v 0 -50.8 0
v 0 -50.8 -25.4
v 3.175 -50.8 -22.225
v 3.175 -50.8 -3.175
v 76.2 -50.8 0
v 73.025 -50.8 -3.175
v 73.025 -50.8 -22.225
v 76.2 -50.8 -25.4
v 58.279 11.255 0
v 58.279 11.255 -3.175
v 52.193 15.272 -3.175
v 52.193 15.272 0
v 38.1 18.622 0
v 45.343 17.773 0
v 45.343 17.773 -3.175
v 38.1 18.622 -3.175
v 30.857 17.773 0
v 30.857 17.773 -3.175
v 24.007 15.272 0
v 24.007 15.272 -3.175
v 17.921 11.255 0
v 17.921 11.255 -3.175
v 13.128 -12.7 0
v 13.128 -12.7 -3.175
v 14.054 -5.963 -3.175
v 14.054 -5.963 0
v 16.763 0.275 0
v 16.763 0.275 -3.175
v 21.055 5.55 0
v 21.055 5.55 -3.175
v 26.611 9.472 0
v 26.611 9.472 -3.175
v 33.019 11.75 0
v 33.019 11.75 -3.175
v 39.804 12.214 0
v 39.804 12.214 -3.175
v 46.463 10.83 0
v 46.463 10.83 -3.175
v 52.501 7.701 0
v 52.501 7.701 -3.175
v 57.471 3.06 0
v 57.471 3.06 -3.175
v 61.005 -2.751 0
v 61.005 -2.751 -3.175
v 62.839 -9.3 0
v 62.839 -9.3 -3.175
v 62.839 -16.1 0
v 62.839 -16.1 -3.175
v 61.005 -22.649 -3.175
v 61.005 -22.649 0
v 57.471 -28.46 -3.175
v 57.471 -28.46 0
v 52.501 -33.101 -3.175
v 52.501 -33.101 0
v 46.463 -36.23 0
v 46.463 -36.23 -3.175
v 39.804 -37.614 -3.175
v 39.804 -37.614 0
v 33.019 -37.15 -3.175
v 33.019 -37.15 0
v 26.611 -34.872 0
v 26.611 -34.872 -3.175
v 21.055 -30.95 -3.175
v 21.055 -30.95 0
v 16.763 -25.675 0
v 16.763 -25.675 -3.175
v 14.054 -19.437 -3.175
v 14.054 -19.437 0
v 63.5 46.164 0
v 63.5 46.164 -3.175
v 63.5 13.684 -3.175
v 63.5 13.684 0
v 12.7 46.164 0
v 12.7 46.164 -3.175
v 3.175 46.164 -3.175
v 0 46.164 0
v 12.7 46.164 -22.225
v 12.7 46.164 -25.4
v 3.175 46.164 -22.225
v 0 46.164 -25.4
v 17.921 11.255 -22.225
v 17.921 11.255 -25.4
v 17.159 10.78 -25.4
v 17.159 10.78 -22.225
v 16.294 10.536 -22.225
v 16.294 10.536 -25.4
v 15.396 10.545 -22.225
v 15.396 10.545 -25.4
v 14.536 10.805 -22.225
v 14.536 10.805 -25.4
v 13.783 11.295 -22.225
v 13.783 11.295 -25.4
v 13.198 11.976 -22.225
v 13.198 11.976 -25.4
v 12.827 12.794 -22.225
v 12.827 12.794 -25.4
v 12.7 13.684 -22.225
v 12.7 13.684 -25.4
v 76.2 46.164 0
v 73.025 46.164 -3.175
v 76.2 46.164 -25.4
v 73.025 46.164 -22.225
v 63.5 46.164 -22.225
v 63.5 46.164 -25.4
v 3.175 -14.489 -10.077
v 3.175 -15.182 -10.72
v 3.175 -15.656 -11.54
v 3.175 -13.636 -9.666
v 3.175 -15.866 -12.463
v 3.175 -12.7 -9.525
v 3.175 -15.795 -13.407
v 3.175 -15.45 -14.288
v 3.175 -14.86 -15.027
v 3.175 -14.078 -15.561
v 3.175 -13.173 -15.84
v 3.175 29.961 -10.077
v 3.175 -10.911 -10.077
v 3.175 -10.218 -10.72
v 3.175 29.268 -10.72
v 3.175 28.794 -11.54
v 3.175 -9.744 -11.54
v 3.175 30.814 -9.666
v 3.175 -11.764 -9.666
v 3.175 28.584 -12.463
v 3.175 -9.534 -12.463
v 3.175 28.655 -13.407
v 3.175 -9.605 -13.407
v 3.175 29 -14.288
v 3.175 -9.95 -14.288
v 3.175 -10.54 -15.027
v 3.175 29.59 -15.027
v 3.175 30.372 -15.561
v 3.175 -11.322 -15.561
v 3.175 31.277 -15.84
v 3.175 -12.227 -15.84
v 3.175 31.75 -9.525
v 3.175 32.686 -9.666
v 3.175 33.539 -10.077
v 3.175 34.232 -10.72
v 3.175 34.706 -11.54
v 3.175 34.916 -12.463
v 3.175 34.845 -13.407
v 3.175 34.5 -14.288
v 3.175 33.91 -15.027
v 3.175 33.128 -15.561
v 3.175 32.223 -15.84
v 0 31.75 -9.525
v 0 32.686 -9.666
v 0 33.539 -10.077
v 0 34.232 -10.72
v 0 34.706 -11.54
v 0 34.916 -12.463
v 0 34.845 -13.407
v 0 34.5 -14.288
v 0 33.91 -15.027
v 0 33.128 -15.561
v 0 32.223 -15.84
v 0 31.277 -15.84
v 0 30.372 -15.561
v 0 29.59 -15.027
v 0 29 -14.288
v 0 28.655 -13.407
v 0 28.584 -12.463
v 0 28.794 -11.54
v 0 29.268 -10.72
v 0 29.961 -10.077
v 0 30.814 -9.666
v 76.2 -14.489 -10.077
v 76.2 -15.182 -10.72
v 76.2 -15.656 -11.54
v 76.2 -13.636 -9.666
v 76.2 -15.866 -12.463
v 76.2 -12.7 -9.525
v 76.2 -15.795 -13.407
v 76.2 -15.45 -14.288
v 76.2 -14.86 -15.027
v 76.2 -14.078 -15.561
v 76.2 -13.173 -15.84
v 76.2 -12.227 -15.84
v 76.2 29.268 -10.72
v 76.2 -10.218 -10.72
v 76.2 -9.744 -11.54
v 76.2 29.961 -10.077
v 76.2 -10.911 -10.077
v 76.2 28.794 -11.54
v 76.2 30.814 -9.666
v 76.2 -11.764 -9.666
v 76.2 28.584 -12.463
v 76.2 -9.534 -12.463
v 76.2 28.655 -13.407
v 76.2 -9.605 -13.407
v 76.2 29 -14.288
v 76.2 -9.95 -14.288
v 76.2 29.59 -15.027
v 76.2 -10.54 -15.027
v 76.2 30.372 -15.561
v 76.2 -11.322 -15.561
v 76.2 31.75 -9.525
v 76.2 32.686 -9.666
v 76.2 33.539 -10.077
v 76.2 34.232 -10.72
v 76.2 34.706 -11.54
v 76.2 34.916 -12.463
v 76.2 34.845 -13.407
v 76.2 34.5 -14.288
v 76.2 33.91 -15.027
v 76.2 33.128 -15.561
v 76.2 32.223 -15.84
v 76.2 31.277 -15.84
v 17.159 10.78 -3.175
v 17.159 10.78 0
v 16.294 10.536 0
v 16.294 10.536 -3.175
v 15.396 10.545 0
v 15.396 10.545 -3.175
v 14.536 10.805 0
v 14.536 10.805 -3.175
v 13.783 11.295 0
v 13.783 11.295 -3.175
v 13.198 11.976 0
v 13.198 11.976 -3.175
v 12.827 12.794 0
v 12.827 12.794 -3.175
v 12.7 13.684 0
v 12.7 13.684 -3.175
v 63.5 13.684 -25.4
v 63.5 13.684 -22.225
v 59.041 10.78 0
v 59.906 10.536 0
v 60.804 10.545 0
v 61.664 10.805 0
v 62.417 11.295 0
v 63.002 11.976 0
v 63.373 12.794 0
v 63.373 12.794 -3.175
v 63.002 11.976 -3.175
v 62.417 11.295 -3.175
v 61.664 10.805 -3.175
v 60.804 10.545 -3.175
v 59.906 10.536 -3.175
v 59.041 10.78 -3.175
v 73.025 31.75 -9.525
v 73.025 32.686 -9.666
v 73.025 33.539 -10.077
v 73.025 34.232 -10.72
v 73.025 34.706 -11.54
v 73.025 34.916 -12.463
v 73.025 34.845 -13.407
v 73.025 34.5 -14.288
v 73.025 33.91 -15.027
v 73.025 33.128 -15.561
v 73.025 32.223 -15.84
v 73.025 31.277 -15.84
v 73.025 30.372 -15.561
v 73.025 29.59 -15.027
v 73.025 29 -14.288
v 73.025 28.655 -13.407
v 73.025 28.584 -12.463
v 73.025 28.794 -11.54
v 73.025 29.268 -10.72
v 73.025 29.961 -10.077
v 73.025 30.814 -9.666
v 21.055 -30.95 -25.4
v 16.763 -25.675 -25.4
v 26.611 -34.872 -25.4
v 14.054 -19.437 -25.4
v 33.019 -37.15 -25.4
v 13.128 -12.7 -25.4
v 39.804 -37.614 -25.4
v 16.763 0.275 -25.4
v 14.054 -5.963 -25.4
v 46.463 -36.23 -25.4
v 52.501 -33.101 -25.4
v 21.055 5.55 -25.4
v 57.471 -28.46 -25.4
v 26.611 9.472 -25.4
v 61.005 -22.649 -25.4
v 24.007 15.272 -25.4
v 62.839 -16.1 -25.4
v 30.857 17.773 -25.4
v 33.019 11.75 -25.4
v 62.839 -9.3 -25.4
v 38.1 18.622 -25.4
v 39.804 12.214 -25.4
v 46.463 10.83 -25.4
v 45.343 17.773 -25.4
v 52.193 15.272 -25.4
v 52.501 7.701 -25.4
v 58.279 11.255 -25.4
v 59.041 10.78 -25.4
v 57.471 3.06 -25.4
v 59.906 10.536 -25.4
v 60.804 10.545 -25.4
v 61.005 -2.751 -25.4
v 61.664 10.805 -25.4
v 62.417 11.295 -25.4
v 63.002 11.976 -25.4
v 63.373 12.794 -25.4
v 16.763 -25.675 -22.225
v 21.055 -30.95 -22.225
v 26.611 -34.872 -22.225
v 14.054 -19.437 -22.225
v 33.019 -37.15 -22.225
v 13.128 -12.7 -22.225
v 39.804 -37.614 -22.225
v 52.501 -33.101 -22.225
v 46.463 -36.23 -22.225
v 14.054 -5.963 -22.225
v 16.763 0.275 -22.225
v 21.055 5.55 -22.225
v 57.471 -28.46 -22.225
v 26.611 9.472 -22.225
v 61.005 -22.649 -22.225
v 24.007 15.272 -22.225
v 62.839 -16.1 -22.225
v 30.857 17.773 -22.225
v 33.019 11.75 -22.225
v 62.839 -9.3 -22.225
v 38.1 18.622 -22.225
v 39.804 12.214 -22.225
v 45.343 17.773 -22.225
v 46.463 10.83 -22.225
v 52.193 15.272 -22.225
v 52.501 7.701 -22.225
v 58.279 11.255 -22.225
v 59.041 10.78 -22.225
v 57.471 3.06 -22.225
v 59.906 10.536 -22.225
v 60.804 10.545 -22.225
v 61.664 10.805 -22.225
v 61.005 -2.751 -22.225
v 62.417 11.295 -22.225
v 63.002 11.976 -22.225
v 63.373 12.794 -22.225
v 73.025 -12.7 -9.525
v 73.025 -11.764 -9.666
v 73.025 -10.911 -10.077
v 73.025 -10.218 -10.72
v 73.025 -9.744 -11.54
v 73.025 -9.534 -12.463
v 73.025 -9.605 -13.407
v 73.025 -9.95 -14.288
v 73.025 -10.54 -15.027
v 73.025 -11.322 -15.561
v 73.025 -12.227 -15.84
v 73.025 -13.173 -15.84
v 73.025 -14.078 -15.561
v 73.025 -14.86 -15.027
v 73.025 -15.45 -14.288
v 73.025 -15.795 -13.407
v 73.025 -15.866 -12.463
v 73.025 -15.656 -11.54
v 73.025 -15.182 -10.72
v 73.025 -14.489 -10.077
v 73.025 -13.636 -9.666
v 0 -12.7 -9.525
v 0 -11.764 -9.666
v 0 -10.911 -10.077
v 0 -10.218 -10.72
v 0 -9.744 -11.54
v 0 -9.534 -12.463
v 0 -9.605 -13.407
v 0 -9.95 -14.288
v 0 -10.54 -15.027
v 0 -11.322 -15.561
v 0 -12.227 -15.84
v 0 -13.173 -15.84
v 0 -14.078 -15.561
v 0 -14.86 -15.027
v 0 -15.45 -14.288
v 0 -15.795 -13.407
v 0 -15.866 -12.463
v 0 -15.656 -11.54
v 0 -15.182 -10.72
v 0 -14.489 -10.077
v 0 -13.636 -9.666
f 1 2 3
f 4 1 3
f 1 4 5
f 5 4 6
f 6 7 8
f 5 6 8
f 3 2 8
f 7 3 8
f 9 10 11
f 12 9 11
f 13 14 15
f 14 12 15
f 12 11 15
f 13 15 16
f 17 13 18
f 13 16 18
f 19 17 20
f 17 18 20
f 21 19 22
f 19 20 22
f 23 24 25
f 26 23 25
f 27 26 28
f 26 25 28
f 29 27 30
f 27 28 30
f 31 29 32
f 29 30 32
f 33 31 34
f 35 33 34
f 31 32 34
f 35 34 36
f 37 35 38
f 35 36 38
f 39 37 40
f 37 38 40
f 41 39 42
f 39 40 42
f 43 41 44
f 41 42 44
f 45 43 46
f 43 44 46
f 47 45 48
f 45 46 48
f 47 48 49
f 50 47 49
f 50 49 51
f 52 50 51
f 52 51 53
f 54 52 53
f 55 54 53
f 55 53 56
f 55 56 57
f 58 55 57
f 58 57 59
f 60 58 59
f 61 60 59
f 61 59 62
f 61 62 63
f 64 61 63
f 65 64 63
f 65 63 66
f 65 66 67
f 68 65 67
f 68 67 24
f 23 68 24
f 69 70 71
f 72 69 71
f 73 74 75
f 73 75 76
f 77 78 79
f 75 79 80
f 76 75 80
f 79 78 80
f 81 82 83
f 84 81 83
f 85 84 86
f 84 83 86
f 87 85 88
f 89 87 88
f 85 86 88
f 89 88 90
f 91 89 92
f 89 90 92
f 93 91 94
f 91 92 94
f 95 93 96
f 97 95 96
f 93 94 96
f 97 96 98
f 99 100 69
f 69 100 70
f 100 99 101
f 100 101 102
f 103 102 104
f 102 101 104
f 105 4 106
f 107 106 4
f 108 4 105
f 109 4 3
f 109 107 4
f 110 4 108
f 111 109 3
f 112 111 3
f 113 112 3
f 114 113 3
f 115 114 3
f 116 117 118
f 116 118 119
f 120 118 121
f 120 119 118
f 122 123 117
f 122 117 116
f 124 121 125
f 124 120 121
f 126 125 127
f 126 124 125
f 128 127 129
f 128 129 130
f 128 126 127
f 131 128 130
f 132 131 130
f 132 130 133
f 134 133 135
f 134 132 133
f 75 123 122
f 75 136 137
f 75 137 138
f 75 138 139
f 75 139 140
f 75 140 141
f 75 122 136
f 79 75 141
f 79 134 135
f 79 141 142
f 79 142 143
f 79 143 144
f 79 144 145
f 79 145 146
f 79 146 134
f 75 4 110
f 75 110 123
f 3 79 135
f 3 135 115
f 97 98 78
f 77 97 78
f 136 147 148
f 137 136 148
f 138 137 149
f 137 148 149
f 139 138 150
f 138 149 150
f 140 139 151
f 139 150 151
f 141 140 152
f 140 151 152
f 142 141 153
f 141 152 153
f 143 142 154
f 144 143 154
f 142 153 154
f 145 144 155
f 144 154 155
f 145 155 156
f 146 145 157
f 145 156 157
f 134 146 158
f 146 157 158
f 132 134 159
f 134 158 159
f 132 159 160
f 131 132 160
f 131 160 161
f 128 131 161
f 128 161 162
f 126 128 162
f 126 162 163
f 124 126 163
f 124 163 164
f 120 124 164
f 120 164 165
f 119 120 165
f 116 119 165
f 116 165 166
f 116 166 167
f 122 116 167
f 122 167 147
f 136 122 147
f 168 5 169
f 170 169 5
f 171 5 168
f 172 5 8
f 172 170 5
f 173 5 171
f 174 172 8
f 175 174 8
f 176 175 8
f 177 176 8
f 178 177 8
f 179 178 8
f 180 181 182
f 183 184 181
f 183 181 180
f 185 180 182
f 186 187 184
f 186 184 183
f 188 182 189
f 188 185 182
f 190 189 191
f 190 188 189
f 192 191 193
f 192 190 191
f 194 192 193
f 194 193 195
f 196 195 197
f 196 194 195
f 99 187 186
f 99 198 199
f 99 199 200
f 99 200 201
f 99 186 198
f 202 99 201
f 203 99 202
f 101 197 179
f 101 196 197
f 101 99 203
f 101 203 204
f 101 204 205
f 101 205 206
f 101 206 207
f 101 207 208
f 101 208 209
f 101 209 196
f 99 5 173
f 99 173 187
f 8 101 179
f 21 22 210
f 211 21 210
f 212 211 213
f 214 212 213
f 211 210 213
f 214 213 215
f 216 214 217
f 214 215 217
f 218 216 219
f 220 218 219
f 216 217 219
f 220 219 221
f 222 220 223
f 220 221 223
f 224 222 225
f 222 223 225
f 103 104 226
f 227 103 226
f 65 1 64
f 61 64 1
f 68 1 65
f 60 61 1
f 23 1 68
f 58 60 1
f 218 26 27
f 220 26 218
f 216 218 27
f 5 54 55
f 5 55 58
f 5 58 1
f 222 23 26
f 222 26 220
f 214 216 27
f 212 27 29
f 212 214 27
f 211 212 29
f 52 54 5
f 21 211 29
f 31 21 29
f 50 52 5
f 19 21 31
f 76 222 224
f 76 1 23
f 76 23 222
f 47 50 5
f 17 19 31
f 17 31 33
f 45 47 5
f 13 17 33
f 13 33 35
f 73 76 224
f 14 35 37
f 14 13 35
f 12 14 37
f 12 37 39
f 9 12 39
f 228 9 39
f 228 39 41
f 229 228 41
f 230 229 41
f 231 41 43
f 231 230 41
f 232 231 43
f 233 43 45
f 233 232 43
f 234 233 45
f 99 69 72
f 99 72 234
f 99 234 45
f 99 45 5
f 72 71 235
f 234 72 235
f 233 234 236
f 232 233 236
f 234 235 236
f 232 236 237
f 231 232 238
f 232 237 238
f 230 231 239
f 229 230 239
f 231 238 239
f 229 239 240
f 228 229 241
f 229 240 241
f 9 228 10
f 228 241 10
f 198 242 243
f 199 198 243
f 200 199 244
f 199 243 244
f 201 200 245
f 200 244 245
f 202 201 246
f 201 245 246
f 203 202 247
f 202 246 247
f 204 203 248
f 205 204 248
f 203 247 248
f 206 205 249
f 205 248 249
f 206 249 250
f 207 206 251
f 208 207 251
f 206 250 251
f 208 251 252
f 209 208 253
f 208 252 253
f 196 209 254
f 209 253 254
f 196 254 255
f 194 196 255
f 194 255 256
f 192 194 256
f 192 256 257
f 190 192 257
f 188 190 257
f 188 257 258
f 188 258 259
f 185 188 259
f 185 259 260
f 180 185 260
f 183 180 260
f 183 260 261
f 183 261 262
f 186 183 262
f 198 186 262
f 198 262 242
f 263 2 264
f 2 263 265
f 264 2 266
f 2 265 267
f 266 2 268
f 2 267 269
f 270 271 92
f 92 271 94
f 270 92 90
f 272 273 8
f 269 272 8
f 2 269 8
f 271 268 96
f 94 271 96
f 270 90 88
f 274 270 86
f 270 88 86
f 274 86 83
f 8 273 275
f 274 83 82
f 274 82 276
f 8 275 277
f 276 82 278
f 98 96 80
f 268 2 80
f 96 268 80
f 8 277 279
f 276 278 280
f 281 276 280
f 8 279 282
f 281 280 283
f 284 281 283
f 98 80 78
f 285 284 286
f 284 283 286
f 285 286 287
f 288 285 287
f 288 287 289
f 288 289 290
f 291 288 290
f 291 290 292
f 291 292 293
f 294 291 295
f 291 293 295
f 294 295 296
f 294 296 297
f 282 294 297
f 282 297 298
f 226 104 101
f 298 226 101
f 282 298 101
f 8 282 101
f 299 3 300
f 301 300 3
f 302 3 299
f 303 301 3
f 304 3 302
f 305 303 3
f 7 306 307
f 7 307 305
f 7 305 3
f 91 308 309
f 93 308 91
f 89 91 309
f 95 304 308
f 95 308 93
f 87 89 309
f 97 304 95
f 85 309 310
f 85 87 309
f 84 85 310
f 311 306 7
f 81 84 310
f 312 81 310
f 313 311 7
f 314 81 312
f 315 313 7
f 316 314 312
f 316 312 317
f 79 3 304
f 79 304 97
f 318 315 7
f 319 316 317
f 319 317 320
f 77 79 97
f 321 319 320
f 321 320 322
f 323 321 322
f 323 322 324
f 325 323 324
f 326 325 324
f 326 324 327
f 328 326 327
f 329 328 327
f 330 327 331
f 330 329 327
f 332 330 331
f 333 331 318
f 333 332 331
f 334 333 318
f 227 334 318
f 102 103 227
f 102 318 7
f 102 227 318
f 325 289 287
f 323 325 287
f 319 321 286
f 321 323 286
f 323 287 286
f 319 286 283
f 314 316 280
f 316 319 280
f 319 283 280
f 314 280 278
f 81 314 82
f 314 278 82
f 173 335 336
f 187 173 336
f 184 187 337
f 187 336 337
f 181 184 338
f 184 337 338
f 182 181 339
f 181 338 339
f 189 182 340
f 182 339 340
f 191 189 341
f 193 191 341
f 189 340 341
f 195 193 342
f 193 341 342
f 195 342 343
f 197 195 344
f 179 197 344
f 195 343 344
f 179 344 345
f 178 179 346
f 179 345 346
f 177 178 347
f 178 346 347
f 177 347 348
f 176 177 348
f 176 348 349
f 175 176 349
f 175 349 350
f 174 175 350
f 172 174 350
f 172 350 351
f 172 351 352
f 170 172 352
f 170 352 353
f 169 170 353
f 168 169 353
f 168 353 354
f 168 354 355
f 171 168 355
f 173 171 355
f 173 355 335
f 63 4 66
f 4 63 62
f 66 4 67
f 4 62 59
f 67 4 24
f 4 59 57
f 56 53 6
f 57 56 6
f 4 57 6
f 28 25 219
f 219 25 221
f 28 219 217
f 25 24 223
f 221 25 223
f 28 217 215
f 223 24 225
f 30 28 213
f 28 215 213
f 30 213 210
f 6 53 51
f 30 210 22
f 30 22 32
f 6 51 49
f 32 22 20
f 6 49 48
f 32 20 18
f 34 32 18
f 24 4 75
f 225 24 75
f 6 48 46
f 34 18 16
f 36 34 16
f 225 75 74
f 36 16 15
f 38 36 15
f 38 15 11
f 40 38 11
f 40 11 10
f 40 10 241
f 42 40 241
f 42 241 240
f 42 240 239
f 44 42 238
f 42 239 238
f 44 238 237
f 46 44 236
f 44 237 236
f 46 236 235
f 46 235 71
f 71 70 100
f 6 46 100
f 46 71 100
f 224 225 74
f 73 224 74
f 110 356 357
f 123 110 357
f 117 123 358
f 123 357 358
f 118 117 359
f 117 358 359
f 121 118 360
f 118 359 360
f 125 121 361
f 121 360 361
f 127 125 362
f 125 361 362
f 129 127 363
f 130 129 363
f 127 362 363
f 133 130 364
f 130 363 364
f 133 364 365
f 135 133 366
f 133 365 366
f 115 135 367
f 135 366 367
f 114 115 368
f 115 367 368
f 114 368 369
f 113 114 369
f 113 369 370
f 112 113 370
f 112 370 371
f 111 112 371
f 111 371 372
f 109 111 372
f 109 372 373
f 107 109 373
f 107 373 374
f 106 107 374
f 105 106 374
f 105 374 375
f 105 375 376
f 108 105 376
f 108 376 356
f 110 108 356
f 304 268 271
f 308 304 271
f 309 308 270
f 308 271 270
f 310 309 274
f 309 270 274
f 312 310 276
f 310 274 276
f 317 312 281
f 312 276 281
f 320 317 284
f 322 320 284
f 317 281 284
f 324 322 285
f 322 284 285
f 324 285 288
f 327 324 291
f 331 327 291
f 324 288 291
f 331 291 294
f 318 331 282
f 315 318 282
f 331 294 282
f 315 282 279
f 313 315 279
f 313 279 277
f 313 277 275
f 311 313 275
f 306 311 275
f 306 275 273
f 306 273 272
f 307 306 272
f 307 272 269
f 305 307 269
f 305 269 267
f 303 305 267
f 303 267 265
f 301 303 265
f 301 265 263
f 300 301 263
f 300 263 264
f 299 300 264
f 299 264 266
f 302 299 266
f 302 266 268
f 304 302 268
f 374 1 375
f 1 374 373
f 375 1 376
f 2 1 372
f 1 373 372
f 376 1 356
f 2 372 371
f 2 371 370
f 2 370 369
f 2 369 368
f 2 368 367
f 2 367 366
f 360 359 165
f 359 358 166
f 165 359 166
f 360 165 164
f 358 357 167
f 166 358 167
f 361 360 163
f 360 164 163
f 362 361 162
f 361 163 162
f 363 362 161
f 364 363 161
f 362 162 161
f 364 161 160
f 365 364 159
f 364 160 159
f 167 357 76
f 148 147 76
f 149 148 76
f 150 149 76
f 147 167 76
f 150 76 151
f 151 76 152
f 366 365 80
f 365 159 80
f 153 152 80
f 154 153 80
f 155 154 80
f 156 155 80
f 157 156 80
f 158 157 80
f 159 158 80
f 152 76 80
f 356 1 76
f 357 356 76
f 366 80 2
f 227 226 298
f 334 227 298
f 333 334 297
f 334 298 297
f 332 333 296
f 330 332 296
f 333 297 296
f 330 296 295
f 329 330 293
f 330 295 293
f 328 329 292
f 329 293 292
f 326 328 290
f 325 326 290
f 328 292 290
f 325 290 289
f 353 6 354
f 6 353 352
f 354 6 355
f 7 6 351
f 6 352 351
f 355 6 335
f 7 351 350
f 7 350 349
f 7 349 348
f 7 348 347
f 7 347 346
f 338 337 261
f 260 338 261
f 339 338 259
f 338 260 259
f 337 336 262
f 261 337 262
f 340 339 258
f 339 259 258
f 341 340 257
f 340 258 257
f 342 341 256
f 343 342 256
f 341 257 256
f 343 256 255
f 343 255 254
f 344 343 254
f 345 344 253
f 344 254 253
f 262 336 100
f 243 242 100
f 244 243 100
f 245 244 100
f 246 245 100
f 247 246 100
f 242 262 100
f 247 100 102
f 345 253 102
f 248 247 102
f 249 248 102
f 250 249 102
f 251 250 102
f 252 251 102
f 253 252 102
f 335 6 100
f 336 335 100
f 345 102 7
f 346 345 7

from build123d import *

# Parameters (mm, degrees)
SKETCH1_W           = 76.2
SKETCH1_H           = 25.4
SKETCH1_W_2         = 69.85
SKETCH1_H_2         = 19.05
EXTRUDE_THIN1_DEPTH = 50.8
SKETCH2_R           = 24.97201
CUT_EXTRUDE1_DEPTH  = 52.578
CUT_EXTRUDE2_DEPTH  = 26.4
SKETCH6_R           = 3.175
CUT_EXTRUDE3_DEPTH  = 77.2
SKETCH7_R           = 3.175
CUT_EXTRUDE4_DEPTH  = 77.2


with BuildPart() as part:
    # Sketch1 → Extrude-Thin1 (new body, symmetric)
    with BuildSketch(Plane(origin=(0, 0, 0), x_dir=(1, 0, 0), z_dir=(0, 1, 0))):
        with Locations((38.1, 12.7)):
            Rectangle(SKETCH1_W, SKETCH1_H)
        with Locations((38.1, 12.7)):
            Rectangle(SKETCH1_W_2, SKETCH1_H_2, mode=Mode.SUBTRACT)
    extrude(amount=EXTRUDE_THIN1_DEPTH, both=True)

    # Sketch2 → Cut-Extrude1 (cut)
    with BuildSketch(Plane(origin=(0, 0, -25.4), x_dir=(-1, 0, 0), z_dir=(0, 0, -1))):
        with Locations((-38.1, -12.7)):
            Circle(SKETCH2_R)
    extrude(amount=-CUT_EXTRUDE1_DEPTH, mode=Mode.SUBTRACT)

    # Sketch5 → Cut-Extrude2 (cut, through all)
    with BuildSketch(Plane(origin=(0, 0, -25.4), x_dir=(-1, 0, 0), z_dir=(0, 0, -1))):
        Polygon((0, 50.8), (-76.2, 50.8), (-76.2, 46.1645), (-63.5, 46.1645), (-12.7, 46.1645), (0, 46.1645), align=None)
        with BuildLine():
            Line((-12.7, 46.1645), (-63.5, 46.1645))
            Line((-63.5, 46.1645), (-63.5, 13.683575837))
            ThreePointArc((-63.5, 13.683575837), (-61.664047105, 10.804760481), (-58.279478519, 11.255311669))
            ThreePointArc((-58.279478519, 11.255311669), (-38.1, 18.62201), (-17.920521481, 11.255311669))
            ThreePointArc((-17.920521481, 11.255311669), (-14.535952895, 10.804760481), (-12.7, 13.683575837))
            Line((-12.7, 13.683575837), (-12.7, 46.1645))
        make_face()
    extrude(amount=-CUT_EXTRUDE2_DEPTH, mode=Mode.SUBTRACT)

    # Sketch6 → Cut-Extrude3 (cut, through all)
    with BuildSketch(Plane.ZY):
        with Locations((-12.7, 31.75)):
            Circle(SKETCH6_R)
    extrude(amount=-CUT_EXTRUDE3_DEPTH, mode=Mode.SUBTRACT)

    # Sketch7 → Cut-Extrude4 (cut, through all)
    with BuildSketch(Plane.ZY):
        with Locations((-12.7, -12.7)):
            Circle(SKETCH7_R)
    extrude(amount=-CUT_EXTRUDE4_DEPTH, mode=Mode.SUBTRACT)


solid = part.part
